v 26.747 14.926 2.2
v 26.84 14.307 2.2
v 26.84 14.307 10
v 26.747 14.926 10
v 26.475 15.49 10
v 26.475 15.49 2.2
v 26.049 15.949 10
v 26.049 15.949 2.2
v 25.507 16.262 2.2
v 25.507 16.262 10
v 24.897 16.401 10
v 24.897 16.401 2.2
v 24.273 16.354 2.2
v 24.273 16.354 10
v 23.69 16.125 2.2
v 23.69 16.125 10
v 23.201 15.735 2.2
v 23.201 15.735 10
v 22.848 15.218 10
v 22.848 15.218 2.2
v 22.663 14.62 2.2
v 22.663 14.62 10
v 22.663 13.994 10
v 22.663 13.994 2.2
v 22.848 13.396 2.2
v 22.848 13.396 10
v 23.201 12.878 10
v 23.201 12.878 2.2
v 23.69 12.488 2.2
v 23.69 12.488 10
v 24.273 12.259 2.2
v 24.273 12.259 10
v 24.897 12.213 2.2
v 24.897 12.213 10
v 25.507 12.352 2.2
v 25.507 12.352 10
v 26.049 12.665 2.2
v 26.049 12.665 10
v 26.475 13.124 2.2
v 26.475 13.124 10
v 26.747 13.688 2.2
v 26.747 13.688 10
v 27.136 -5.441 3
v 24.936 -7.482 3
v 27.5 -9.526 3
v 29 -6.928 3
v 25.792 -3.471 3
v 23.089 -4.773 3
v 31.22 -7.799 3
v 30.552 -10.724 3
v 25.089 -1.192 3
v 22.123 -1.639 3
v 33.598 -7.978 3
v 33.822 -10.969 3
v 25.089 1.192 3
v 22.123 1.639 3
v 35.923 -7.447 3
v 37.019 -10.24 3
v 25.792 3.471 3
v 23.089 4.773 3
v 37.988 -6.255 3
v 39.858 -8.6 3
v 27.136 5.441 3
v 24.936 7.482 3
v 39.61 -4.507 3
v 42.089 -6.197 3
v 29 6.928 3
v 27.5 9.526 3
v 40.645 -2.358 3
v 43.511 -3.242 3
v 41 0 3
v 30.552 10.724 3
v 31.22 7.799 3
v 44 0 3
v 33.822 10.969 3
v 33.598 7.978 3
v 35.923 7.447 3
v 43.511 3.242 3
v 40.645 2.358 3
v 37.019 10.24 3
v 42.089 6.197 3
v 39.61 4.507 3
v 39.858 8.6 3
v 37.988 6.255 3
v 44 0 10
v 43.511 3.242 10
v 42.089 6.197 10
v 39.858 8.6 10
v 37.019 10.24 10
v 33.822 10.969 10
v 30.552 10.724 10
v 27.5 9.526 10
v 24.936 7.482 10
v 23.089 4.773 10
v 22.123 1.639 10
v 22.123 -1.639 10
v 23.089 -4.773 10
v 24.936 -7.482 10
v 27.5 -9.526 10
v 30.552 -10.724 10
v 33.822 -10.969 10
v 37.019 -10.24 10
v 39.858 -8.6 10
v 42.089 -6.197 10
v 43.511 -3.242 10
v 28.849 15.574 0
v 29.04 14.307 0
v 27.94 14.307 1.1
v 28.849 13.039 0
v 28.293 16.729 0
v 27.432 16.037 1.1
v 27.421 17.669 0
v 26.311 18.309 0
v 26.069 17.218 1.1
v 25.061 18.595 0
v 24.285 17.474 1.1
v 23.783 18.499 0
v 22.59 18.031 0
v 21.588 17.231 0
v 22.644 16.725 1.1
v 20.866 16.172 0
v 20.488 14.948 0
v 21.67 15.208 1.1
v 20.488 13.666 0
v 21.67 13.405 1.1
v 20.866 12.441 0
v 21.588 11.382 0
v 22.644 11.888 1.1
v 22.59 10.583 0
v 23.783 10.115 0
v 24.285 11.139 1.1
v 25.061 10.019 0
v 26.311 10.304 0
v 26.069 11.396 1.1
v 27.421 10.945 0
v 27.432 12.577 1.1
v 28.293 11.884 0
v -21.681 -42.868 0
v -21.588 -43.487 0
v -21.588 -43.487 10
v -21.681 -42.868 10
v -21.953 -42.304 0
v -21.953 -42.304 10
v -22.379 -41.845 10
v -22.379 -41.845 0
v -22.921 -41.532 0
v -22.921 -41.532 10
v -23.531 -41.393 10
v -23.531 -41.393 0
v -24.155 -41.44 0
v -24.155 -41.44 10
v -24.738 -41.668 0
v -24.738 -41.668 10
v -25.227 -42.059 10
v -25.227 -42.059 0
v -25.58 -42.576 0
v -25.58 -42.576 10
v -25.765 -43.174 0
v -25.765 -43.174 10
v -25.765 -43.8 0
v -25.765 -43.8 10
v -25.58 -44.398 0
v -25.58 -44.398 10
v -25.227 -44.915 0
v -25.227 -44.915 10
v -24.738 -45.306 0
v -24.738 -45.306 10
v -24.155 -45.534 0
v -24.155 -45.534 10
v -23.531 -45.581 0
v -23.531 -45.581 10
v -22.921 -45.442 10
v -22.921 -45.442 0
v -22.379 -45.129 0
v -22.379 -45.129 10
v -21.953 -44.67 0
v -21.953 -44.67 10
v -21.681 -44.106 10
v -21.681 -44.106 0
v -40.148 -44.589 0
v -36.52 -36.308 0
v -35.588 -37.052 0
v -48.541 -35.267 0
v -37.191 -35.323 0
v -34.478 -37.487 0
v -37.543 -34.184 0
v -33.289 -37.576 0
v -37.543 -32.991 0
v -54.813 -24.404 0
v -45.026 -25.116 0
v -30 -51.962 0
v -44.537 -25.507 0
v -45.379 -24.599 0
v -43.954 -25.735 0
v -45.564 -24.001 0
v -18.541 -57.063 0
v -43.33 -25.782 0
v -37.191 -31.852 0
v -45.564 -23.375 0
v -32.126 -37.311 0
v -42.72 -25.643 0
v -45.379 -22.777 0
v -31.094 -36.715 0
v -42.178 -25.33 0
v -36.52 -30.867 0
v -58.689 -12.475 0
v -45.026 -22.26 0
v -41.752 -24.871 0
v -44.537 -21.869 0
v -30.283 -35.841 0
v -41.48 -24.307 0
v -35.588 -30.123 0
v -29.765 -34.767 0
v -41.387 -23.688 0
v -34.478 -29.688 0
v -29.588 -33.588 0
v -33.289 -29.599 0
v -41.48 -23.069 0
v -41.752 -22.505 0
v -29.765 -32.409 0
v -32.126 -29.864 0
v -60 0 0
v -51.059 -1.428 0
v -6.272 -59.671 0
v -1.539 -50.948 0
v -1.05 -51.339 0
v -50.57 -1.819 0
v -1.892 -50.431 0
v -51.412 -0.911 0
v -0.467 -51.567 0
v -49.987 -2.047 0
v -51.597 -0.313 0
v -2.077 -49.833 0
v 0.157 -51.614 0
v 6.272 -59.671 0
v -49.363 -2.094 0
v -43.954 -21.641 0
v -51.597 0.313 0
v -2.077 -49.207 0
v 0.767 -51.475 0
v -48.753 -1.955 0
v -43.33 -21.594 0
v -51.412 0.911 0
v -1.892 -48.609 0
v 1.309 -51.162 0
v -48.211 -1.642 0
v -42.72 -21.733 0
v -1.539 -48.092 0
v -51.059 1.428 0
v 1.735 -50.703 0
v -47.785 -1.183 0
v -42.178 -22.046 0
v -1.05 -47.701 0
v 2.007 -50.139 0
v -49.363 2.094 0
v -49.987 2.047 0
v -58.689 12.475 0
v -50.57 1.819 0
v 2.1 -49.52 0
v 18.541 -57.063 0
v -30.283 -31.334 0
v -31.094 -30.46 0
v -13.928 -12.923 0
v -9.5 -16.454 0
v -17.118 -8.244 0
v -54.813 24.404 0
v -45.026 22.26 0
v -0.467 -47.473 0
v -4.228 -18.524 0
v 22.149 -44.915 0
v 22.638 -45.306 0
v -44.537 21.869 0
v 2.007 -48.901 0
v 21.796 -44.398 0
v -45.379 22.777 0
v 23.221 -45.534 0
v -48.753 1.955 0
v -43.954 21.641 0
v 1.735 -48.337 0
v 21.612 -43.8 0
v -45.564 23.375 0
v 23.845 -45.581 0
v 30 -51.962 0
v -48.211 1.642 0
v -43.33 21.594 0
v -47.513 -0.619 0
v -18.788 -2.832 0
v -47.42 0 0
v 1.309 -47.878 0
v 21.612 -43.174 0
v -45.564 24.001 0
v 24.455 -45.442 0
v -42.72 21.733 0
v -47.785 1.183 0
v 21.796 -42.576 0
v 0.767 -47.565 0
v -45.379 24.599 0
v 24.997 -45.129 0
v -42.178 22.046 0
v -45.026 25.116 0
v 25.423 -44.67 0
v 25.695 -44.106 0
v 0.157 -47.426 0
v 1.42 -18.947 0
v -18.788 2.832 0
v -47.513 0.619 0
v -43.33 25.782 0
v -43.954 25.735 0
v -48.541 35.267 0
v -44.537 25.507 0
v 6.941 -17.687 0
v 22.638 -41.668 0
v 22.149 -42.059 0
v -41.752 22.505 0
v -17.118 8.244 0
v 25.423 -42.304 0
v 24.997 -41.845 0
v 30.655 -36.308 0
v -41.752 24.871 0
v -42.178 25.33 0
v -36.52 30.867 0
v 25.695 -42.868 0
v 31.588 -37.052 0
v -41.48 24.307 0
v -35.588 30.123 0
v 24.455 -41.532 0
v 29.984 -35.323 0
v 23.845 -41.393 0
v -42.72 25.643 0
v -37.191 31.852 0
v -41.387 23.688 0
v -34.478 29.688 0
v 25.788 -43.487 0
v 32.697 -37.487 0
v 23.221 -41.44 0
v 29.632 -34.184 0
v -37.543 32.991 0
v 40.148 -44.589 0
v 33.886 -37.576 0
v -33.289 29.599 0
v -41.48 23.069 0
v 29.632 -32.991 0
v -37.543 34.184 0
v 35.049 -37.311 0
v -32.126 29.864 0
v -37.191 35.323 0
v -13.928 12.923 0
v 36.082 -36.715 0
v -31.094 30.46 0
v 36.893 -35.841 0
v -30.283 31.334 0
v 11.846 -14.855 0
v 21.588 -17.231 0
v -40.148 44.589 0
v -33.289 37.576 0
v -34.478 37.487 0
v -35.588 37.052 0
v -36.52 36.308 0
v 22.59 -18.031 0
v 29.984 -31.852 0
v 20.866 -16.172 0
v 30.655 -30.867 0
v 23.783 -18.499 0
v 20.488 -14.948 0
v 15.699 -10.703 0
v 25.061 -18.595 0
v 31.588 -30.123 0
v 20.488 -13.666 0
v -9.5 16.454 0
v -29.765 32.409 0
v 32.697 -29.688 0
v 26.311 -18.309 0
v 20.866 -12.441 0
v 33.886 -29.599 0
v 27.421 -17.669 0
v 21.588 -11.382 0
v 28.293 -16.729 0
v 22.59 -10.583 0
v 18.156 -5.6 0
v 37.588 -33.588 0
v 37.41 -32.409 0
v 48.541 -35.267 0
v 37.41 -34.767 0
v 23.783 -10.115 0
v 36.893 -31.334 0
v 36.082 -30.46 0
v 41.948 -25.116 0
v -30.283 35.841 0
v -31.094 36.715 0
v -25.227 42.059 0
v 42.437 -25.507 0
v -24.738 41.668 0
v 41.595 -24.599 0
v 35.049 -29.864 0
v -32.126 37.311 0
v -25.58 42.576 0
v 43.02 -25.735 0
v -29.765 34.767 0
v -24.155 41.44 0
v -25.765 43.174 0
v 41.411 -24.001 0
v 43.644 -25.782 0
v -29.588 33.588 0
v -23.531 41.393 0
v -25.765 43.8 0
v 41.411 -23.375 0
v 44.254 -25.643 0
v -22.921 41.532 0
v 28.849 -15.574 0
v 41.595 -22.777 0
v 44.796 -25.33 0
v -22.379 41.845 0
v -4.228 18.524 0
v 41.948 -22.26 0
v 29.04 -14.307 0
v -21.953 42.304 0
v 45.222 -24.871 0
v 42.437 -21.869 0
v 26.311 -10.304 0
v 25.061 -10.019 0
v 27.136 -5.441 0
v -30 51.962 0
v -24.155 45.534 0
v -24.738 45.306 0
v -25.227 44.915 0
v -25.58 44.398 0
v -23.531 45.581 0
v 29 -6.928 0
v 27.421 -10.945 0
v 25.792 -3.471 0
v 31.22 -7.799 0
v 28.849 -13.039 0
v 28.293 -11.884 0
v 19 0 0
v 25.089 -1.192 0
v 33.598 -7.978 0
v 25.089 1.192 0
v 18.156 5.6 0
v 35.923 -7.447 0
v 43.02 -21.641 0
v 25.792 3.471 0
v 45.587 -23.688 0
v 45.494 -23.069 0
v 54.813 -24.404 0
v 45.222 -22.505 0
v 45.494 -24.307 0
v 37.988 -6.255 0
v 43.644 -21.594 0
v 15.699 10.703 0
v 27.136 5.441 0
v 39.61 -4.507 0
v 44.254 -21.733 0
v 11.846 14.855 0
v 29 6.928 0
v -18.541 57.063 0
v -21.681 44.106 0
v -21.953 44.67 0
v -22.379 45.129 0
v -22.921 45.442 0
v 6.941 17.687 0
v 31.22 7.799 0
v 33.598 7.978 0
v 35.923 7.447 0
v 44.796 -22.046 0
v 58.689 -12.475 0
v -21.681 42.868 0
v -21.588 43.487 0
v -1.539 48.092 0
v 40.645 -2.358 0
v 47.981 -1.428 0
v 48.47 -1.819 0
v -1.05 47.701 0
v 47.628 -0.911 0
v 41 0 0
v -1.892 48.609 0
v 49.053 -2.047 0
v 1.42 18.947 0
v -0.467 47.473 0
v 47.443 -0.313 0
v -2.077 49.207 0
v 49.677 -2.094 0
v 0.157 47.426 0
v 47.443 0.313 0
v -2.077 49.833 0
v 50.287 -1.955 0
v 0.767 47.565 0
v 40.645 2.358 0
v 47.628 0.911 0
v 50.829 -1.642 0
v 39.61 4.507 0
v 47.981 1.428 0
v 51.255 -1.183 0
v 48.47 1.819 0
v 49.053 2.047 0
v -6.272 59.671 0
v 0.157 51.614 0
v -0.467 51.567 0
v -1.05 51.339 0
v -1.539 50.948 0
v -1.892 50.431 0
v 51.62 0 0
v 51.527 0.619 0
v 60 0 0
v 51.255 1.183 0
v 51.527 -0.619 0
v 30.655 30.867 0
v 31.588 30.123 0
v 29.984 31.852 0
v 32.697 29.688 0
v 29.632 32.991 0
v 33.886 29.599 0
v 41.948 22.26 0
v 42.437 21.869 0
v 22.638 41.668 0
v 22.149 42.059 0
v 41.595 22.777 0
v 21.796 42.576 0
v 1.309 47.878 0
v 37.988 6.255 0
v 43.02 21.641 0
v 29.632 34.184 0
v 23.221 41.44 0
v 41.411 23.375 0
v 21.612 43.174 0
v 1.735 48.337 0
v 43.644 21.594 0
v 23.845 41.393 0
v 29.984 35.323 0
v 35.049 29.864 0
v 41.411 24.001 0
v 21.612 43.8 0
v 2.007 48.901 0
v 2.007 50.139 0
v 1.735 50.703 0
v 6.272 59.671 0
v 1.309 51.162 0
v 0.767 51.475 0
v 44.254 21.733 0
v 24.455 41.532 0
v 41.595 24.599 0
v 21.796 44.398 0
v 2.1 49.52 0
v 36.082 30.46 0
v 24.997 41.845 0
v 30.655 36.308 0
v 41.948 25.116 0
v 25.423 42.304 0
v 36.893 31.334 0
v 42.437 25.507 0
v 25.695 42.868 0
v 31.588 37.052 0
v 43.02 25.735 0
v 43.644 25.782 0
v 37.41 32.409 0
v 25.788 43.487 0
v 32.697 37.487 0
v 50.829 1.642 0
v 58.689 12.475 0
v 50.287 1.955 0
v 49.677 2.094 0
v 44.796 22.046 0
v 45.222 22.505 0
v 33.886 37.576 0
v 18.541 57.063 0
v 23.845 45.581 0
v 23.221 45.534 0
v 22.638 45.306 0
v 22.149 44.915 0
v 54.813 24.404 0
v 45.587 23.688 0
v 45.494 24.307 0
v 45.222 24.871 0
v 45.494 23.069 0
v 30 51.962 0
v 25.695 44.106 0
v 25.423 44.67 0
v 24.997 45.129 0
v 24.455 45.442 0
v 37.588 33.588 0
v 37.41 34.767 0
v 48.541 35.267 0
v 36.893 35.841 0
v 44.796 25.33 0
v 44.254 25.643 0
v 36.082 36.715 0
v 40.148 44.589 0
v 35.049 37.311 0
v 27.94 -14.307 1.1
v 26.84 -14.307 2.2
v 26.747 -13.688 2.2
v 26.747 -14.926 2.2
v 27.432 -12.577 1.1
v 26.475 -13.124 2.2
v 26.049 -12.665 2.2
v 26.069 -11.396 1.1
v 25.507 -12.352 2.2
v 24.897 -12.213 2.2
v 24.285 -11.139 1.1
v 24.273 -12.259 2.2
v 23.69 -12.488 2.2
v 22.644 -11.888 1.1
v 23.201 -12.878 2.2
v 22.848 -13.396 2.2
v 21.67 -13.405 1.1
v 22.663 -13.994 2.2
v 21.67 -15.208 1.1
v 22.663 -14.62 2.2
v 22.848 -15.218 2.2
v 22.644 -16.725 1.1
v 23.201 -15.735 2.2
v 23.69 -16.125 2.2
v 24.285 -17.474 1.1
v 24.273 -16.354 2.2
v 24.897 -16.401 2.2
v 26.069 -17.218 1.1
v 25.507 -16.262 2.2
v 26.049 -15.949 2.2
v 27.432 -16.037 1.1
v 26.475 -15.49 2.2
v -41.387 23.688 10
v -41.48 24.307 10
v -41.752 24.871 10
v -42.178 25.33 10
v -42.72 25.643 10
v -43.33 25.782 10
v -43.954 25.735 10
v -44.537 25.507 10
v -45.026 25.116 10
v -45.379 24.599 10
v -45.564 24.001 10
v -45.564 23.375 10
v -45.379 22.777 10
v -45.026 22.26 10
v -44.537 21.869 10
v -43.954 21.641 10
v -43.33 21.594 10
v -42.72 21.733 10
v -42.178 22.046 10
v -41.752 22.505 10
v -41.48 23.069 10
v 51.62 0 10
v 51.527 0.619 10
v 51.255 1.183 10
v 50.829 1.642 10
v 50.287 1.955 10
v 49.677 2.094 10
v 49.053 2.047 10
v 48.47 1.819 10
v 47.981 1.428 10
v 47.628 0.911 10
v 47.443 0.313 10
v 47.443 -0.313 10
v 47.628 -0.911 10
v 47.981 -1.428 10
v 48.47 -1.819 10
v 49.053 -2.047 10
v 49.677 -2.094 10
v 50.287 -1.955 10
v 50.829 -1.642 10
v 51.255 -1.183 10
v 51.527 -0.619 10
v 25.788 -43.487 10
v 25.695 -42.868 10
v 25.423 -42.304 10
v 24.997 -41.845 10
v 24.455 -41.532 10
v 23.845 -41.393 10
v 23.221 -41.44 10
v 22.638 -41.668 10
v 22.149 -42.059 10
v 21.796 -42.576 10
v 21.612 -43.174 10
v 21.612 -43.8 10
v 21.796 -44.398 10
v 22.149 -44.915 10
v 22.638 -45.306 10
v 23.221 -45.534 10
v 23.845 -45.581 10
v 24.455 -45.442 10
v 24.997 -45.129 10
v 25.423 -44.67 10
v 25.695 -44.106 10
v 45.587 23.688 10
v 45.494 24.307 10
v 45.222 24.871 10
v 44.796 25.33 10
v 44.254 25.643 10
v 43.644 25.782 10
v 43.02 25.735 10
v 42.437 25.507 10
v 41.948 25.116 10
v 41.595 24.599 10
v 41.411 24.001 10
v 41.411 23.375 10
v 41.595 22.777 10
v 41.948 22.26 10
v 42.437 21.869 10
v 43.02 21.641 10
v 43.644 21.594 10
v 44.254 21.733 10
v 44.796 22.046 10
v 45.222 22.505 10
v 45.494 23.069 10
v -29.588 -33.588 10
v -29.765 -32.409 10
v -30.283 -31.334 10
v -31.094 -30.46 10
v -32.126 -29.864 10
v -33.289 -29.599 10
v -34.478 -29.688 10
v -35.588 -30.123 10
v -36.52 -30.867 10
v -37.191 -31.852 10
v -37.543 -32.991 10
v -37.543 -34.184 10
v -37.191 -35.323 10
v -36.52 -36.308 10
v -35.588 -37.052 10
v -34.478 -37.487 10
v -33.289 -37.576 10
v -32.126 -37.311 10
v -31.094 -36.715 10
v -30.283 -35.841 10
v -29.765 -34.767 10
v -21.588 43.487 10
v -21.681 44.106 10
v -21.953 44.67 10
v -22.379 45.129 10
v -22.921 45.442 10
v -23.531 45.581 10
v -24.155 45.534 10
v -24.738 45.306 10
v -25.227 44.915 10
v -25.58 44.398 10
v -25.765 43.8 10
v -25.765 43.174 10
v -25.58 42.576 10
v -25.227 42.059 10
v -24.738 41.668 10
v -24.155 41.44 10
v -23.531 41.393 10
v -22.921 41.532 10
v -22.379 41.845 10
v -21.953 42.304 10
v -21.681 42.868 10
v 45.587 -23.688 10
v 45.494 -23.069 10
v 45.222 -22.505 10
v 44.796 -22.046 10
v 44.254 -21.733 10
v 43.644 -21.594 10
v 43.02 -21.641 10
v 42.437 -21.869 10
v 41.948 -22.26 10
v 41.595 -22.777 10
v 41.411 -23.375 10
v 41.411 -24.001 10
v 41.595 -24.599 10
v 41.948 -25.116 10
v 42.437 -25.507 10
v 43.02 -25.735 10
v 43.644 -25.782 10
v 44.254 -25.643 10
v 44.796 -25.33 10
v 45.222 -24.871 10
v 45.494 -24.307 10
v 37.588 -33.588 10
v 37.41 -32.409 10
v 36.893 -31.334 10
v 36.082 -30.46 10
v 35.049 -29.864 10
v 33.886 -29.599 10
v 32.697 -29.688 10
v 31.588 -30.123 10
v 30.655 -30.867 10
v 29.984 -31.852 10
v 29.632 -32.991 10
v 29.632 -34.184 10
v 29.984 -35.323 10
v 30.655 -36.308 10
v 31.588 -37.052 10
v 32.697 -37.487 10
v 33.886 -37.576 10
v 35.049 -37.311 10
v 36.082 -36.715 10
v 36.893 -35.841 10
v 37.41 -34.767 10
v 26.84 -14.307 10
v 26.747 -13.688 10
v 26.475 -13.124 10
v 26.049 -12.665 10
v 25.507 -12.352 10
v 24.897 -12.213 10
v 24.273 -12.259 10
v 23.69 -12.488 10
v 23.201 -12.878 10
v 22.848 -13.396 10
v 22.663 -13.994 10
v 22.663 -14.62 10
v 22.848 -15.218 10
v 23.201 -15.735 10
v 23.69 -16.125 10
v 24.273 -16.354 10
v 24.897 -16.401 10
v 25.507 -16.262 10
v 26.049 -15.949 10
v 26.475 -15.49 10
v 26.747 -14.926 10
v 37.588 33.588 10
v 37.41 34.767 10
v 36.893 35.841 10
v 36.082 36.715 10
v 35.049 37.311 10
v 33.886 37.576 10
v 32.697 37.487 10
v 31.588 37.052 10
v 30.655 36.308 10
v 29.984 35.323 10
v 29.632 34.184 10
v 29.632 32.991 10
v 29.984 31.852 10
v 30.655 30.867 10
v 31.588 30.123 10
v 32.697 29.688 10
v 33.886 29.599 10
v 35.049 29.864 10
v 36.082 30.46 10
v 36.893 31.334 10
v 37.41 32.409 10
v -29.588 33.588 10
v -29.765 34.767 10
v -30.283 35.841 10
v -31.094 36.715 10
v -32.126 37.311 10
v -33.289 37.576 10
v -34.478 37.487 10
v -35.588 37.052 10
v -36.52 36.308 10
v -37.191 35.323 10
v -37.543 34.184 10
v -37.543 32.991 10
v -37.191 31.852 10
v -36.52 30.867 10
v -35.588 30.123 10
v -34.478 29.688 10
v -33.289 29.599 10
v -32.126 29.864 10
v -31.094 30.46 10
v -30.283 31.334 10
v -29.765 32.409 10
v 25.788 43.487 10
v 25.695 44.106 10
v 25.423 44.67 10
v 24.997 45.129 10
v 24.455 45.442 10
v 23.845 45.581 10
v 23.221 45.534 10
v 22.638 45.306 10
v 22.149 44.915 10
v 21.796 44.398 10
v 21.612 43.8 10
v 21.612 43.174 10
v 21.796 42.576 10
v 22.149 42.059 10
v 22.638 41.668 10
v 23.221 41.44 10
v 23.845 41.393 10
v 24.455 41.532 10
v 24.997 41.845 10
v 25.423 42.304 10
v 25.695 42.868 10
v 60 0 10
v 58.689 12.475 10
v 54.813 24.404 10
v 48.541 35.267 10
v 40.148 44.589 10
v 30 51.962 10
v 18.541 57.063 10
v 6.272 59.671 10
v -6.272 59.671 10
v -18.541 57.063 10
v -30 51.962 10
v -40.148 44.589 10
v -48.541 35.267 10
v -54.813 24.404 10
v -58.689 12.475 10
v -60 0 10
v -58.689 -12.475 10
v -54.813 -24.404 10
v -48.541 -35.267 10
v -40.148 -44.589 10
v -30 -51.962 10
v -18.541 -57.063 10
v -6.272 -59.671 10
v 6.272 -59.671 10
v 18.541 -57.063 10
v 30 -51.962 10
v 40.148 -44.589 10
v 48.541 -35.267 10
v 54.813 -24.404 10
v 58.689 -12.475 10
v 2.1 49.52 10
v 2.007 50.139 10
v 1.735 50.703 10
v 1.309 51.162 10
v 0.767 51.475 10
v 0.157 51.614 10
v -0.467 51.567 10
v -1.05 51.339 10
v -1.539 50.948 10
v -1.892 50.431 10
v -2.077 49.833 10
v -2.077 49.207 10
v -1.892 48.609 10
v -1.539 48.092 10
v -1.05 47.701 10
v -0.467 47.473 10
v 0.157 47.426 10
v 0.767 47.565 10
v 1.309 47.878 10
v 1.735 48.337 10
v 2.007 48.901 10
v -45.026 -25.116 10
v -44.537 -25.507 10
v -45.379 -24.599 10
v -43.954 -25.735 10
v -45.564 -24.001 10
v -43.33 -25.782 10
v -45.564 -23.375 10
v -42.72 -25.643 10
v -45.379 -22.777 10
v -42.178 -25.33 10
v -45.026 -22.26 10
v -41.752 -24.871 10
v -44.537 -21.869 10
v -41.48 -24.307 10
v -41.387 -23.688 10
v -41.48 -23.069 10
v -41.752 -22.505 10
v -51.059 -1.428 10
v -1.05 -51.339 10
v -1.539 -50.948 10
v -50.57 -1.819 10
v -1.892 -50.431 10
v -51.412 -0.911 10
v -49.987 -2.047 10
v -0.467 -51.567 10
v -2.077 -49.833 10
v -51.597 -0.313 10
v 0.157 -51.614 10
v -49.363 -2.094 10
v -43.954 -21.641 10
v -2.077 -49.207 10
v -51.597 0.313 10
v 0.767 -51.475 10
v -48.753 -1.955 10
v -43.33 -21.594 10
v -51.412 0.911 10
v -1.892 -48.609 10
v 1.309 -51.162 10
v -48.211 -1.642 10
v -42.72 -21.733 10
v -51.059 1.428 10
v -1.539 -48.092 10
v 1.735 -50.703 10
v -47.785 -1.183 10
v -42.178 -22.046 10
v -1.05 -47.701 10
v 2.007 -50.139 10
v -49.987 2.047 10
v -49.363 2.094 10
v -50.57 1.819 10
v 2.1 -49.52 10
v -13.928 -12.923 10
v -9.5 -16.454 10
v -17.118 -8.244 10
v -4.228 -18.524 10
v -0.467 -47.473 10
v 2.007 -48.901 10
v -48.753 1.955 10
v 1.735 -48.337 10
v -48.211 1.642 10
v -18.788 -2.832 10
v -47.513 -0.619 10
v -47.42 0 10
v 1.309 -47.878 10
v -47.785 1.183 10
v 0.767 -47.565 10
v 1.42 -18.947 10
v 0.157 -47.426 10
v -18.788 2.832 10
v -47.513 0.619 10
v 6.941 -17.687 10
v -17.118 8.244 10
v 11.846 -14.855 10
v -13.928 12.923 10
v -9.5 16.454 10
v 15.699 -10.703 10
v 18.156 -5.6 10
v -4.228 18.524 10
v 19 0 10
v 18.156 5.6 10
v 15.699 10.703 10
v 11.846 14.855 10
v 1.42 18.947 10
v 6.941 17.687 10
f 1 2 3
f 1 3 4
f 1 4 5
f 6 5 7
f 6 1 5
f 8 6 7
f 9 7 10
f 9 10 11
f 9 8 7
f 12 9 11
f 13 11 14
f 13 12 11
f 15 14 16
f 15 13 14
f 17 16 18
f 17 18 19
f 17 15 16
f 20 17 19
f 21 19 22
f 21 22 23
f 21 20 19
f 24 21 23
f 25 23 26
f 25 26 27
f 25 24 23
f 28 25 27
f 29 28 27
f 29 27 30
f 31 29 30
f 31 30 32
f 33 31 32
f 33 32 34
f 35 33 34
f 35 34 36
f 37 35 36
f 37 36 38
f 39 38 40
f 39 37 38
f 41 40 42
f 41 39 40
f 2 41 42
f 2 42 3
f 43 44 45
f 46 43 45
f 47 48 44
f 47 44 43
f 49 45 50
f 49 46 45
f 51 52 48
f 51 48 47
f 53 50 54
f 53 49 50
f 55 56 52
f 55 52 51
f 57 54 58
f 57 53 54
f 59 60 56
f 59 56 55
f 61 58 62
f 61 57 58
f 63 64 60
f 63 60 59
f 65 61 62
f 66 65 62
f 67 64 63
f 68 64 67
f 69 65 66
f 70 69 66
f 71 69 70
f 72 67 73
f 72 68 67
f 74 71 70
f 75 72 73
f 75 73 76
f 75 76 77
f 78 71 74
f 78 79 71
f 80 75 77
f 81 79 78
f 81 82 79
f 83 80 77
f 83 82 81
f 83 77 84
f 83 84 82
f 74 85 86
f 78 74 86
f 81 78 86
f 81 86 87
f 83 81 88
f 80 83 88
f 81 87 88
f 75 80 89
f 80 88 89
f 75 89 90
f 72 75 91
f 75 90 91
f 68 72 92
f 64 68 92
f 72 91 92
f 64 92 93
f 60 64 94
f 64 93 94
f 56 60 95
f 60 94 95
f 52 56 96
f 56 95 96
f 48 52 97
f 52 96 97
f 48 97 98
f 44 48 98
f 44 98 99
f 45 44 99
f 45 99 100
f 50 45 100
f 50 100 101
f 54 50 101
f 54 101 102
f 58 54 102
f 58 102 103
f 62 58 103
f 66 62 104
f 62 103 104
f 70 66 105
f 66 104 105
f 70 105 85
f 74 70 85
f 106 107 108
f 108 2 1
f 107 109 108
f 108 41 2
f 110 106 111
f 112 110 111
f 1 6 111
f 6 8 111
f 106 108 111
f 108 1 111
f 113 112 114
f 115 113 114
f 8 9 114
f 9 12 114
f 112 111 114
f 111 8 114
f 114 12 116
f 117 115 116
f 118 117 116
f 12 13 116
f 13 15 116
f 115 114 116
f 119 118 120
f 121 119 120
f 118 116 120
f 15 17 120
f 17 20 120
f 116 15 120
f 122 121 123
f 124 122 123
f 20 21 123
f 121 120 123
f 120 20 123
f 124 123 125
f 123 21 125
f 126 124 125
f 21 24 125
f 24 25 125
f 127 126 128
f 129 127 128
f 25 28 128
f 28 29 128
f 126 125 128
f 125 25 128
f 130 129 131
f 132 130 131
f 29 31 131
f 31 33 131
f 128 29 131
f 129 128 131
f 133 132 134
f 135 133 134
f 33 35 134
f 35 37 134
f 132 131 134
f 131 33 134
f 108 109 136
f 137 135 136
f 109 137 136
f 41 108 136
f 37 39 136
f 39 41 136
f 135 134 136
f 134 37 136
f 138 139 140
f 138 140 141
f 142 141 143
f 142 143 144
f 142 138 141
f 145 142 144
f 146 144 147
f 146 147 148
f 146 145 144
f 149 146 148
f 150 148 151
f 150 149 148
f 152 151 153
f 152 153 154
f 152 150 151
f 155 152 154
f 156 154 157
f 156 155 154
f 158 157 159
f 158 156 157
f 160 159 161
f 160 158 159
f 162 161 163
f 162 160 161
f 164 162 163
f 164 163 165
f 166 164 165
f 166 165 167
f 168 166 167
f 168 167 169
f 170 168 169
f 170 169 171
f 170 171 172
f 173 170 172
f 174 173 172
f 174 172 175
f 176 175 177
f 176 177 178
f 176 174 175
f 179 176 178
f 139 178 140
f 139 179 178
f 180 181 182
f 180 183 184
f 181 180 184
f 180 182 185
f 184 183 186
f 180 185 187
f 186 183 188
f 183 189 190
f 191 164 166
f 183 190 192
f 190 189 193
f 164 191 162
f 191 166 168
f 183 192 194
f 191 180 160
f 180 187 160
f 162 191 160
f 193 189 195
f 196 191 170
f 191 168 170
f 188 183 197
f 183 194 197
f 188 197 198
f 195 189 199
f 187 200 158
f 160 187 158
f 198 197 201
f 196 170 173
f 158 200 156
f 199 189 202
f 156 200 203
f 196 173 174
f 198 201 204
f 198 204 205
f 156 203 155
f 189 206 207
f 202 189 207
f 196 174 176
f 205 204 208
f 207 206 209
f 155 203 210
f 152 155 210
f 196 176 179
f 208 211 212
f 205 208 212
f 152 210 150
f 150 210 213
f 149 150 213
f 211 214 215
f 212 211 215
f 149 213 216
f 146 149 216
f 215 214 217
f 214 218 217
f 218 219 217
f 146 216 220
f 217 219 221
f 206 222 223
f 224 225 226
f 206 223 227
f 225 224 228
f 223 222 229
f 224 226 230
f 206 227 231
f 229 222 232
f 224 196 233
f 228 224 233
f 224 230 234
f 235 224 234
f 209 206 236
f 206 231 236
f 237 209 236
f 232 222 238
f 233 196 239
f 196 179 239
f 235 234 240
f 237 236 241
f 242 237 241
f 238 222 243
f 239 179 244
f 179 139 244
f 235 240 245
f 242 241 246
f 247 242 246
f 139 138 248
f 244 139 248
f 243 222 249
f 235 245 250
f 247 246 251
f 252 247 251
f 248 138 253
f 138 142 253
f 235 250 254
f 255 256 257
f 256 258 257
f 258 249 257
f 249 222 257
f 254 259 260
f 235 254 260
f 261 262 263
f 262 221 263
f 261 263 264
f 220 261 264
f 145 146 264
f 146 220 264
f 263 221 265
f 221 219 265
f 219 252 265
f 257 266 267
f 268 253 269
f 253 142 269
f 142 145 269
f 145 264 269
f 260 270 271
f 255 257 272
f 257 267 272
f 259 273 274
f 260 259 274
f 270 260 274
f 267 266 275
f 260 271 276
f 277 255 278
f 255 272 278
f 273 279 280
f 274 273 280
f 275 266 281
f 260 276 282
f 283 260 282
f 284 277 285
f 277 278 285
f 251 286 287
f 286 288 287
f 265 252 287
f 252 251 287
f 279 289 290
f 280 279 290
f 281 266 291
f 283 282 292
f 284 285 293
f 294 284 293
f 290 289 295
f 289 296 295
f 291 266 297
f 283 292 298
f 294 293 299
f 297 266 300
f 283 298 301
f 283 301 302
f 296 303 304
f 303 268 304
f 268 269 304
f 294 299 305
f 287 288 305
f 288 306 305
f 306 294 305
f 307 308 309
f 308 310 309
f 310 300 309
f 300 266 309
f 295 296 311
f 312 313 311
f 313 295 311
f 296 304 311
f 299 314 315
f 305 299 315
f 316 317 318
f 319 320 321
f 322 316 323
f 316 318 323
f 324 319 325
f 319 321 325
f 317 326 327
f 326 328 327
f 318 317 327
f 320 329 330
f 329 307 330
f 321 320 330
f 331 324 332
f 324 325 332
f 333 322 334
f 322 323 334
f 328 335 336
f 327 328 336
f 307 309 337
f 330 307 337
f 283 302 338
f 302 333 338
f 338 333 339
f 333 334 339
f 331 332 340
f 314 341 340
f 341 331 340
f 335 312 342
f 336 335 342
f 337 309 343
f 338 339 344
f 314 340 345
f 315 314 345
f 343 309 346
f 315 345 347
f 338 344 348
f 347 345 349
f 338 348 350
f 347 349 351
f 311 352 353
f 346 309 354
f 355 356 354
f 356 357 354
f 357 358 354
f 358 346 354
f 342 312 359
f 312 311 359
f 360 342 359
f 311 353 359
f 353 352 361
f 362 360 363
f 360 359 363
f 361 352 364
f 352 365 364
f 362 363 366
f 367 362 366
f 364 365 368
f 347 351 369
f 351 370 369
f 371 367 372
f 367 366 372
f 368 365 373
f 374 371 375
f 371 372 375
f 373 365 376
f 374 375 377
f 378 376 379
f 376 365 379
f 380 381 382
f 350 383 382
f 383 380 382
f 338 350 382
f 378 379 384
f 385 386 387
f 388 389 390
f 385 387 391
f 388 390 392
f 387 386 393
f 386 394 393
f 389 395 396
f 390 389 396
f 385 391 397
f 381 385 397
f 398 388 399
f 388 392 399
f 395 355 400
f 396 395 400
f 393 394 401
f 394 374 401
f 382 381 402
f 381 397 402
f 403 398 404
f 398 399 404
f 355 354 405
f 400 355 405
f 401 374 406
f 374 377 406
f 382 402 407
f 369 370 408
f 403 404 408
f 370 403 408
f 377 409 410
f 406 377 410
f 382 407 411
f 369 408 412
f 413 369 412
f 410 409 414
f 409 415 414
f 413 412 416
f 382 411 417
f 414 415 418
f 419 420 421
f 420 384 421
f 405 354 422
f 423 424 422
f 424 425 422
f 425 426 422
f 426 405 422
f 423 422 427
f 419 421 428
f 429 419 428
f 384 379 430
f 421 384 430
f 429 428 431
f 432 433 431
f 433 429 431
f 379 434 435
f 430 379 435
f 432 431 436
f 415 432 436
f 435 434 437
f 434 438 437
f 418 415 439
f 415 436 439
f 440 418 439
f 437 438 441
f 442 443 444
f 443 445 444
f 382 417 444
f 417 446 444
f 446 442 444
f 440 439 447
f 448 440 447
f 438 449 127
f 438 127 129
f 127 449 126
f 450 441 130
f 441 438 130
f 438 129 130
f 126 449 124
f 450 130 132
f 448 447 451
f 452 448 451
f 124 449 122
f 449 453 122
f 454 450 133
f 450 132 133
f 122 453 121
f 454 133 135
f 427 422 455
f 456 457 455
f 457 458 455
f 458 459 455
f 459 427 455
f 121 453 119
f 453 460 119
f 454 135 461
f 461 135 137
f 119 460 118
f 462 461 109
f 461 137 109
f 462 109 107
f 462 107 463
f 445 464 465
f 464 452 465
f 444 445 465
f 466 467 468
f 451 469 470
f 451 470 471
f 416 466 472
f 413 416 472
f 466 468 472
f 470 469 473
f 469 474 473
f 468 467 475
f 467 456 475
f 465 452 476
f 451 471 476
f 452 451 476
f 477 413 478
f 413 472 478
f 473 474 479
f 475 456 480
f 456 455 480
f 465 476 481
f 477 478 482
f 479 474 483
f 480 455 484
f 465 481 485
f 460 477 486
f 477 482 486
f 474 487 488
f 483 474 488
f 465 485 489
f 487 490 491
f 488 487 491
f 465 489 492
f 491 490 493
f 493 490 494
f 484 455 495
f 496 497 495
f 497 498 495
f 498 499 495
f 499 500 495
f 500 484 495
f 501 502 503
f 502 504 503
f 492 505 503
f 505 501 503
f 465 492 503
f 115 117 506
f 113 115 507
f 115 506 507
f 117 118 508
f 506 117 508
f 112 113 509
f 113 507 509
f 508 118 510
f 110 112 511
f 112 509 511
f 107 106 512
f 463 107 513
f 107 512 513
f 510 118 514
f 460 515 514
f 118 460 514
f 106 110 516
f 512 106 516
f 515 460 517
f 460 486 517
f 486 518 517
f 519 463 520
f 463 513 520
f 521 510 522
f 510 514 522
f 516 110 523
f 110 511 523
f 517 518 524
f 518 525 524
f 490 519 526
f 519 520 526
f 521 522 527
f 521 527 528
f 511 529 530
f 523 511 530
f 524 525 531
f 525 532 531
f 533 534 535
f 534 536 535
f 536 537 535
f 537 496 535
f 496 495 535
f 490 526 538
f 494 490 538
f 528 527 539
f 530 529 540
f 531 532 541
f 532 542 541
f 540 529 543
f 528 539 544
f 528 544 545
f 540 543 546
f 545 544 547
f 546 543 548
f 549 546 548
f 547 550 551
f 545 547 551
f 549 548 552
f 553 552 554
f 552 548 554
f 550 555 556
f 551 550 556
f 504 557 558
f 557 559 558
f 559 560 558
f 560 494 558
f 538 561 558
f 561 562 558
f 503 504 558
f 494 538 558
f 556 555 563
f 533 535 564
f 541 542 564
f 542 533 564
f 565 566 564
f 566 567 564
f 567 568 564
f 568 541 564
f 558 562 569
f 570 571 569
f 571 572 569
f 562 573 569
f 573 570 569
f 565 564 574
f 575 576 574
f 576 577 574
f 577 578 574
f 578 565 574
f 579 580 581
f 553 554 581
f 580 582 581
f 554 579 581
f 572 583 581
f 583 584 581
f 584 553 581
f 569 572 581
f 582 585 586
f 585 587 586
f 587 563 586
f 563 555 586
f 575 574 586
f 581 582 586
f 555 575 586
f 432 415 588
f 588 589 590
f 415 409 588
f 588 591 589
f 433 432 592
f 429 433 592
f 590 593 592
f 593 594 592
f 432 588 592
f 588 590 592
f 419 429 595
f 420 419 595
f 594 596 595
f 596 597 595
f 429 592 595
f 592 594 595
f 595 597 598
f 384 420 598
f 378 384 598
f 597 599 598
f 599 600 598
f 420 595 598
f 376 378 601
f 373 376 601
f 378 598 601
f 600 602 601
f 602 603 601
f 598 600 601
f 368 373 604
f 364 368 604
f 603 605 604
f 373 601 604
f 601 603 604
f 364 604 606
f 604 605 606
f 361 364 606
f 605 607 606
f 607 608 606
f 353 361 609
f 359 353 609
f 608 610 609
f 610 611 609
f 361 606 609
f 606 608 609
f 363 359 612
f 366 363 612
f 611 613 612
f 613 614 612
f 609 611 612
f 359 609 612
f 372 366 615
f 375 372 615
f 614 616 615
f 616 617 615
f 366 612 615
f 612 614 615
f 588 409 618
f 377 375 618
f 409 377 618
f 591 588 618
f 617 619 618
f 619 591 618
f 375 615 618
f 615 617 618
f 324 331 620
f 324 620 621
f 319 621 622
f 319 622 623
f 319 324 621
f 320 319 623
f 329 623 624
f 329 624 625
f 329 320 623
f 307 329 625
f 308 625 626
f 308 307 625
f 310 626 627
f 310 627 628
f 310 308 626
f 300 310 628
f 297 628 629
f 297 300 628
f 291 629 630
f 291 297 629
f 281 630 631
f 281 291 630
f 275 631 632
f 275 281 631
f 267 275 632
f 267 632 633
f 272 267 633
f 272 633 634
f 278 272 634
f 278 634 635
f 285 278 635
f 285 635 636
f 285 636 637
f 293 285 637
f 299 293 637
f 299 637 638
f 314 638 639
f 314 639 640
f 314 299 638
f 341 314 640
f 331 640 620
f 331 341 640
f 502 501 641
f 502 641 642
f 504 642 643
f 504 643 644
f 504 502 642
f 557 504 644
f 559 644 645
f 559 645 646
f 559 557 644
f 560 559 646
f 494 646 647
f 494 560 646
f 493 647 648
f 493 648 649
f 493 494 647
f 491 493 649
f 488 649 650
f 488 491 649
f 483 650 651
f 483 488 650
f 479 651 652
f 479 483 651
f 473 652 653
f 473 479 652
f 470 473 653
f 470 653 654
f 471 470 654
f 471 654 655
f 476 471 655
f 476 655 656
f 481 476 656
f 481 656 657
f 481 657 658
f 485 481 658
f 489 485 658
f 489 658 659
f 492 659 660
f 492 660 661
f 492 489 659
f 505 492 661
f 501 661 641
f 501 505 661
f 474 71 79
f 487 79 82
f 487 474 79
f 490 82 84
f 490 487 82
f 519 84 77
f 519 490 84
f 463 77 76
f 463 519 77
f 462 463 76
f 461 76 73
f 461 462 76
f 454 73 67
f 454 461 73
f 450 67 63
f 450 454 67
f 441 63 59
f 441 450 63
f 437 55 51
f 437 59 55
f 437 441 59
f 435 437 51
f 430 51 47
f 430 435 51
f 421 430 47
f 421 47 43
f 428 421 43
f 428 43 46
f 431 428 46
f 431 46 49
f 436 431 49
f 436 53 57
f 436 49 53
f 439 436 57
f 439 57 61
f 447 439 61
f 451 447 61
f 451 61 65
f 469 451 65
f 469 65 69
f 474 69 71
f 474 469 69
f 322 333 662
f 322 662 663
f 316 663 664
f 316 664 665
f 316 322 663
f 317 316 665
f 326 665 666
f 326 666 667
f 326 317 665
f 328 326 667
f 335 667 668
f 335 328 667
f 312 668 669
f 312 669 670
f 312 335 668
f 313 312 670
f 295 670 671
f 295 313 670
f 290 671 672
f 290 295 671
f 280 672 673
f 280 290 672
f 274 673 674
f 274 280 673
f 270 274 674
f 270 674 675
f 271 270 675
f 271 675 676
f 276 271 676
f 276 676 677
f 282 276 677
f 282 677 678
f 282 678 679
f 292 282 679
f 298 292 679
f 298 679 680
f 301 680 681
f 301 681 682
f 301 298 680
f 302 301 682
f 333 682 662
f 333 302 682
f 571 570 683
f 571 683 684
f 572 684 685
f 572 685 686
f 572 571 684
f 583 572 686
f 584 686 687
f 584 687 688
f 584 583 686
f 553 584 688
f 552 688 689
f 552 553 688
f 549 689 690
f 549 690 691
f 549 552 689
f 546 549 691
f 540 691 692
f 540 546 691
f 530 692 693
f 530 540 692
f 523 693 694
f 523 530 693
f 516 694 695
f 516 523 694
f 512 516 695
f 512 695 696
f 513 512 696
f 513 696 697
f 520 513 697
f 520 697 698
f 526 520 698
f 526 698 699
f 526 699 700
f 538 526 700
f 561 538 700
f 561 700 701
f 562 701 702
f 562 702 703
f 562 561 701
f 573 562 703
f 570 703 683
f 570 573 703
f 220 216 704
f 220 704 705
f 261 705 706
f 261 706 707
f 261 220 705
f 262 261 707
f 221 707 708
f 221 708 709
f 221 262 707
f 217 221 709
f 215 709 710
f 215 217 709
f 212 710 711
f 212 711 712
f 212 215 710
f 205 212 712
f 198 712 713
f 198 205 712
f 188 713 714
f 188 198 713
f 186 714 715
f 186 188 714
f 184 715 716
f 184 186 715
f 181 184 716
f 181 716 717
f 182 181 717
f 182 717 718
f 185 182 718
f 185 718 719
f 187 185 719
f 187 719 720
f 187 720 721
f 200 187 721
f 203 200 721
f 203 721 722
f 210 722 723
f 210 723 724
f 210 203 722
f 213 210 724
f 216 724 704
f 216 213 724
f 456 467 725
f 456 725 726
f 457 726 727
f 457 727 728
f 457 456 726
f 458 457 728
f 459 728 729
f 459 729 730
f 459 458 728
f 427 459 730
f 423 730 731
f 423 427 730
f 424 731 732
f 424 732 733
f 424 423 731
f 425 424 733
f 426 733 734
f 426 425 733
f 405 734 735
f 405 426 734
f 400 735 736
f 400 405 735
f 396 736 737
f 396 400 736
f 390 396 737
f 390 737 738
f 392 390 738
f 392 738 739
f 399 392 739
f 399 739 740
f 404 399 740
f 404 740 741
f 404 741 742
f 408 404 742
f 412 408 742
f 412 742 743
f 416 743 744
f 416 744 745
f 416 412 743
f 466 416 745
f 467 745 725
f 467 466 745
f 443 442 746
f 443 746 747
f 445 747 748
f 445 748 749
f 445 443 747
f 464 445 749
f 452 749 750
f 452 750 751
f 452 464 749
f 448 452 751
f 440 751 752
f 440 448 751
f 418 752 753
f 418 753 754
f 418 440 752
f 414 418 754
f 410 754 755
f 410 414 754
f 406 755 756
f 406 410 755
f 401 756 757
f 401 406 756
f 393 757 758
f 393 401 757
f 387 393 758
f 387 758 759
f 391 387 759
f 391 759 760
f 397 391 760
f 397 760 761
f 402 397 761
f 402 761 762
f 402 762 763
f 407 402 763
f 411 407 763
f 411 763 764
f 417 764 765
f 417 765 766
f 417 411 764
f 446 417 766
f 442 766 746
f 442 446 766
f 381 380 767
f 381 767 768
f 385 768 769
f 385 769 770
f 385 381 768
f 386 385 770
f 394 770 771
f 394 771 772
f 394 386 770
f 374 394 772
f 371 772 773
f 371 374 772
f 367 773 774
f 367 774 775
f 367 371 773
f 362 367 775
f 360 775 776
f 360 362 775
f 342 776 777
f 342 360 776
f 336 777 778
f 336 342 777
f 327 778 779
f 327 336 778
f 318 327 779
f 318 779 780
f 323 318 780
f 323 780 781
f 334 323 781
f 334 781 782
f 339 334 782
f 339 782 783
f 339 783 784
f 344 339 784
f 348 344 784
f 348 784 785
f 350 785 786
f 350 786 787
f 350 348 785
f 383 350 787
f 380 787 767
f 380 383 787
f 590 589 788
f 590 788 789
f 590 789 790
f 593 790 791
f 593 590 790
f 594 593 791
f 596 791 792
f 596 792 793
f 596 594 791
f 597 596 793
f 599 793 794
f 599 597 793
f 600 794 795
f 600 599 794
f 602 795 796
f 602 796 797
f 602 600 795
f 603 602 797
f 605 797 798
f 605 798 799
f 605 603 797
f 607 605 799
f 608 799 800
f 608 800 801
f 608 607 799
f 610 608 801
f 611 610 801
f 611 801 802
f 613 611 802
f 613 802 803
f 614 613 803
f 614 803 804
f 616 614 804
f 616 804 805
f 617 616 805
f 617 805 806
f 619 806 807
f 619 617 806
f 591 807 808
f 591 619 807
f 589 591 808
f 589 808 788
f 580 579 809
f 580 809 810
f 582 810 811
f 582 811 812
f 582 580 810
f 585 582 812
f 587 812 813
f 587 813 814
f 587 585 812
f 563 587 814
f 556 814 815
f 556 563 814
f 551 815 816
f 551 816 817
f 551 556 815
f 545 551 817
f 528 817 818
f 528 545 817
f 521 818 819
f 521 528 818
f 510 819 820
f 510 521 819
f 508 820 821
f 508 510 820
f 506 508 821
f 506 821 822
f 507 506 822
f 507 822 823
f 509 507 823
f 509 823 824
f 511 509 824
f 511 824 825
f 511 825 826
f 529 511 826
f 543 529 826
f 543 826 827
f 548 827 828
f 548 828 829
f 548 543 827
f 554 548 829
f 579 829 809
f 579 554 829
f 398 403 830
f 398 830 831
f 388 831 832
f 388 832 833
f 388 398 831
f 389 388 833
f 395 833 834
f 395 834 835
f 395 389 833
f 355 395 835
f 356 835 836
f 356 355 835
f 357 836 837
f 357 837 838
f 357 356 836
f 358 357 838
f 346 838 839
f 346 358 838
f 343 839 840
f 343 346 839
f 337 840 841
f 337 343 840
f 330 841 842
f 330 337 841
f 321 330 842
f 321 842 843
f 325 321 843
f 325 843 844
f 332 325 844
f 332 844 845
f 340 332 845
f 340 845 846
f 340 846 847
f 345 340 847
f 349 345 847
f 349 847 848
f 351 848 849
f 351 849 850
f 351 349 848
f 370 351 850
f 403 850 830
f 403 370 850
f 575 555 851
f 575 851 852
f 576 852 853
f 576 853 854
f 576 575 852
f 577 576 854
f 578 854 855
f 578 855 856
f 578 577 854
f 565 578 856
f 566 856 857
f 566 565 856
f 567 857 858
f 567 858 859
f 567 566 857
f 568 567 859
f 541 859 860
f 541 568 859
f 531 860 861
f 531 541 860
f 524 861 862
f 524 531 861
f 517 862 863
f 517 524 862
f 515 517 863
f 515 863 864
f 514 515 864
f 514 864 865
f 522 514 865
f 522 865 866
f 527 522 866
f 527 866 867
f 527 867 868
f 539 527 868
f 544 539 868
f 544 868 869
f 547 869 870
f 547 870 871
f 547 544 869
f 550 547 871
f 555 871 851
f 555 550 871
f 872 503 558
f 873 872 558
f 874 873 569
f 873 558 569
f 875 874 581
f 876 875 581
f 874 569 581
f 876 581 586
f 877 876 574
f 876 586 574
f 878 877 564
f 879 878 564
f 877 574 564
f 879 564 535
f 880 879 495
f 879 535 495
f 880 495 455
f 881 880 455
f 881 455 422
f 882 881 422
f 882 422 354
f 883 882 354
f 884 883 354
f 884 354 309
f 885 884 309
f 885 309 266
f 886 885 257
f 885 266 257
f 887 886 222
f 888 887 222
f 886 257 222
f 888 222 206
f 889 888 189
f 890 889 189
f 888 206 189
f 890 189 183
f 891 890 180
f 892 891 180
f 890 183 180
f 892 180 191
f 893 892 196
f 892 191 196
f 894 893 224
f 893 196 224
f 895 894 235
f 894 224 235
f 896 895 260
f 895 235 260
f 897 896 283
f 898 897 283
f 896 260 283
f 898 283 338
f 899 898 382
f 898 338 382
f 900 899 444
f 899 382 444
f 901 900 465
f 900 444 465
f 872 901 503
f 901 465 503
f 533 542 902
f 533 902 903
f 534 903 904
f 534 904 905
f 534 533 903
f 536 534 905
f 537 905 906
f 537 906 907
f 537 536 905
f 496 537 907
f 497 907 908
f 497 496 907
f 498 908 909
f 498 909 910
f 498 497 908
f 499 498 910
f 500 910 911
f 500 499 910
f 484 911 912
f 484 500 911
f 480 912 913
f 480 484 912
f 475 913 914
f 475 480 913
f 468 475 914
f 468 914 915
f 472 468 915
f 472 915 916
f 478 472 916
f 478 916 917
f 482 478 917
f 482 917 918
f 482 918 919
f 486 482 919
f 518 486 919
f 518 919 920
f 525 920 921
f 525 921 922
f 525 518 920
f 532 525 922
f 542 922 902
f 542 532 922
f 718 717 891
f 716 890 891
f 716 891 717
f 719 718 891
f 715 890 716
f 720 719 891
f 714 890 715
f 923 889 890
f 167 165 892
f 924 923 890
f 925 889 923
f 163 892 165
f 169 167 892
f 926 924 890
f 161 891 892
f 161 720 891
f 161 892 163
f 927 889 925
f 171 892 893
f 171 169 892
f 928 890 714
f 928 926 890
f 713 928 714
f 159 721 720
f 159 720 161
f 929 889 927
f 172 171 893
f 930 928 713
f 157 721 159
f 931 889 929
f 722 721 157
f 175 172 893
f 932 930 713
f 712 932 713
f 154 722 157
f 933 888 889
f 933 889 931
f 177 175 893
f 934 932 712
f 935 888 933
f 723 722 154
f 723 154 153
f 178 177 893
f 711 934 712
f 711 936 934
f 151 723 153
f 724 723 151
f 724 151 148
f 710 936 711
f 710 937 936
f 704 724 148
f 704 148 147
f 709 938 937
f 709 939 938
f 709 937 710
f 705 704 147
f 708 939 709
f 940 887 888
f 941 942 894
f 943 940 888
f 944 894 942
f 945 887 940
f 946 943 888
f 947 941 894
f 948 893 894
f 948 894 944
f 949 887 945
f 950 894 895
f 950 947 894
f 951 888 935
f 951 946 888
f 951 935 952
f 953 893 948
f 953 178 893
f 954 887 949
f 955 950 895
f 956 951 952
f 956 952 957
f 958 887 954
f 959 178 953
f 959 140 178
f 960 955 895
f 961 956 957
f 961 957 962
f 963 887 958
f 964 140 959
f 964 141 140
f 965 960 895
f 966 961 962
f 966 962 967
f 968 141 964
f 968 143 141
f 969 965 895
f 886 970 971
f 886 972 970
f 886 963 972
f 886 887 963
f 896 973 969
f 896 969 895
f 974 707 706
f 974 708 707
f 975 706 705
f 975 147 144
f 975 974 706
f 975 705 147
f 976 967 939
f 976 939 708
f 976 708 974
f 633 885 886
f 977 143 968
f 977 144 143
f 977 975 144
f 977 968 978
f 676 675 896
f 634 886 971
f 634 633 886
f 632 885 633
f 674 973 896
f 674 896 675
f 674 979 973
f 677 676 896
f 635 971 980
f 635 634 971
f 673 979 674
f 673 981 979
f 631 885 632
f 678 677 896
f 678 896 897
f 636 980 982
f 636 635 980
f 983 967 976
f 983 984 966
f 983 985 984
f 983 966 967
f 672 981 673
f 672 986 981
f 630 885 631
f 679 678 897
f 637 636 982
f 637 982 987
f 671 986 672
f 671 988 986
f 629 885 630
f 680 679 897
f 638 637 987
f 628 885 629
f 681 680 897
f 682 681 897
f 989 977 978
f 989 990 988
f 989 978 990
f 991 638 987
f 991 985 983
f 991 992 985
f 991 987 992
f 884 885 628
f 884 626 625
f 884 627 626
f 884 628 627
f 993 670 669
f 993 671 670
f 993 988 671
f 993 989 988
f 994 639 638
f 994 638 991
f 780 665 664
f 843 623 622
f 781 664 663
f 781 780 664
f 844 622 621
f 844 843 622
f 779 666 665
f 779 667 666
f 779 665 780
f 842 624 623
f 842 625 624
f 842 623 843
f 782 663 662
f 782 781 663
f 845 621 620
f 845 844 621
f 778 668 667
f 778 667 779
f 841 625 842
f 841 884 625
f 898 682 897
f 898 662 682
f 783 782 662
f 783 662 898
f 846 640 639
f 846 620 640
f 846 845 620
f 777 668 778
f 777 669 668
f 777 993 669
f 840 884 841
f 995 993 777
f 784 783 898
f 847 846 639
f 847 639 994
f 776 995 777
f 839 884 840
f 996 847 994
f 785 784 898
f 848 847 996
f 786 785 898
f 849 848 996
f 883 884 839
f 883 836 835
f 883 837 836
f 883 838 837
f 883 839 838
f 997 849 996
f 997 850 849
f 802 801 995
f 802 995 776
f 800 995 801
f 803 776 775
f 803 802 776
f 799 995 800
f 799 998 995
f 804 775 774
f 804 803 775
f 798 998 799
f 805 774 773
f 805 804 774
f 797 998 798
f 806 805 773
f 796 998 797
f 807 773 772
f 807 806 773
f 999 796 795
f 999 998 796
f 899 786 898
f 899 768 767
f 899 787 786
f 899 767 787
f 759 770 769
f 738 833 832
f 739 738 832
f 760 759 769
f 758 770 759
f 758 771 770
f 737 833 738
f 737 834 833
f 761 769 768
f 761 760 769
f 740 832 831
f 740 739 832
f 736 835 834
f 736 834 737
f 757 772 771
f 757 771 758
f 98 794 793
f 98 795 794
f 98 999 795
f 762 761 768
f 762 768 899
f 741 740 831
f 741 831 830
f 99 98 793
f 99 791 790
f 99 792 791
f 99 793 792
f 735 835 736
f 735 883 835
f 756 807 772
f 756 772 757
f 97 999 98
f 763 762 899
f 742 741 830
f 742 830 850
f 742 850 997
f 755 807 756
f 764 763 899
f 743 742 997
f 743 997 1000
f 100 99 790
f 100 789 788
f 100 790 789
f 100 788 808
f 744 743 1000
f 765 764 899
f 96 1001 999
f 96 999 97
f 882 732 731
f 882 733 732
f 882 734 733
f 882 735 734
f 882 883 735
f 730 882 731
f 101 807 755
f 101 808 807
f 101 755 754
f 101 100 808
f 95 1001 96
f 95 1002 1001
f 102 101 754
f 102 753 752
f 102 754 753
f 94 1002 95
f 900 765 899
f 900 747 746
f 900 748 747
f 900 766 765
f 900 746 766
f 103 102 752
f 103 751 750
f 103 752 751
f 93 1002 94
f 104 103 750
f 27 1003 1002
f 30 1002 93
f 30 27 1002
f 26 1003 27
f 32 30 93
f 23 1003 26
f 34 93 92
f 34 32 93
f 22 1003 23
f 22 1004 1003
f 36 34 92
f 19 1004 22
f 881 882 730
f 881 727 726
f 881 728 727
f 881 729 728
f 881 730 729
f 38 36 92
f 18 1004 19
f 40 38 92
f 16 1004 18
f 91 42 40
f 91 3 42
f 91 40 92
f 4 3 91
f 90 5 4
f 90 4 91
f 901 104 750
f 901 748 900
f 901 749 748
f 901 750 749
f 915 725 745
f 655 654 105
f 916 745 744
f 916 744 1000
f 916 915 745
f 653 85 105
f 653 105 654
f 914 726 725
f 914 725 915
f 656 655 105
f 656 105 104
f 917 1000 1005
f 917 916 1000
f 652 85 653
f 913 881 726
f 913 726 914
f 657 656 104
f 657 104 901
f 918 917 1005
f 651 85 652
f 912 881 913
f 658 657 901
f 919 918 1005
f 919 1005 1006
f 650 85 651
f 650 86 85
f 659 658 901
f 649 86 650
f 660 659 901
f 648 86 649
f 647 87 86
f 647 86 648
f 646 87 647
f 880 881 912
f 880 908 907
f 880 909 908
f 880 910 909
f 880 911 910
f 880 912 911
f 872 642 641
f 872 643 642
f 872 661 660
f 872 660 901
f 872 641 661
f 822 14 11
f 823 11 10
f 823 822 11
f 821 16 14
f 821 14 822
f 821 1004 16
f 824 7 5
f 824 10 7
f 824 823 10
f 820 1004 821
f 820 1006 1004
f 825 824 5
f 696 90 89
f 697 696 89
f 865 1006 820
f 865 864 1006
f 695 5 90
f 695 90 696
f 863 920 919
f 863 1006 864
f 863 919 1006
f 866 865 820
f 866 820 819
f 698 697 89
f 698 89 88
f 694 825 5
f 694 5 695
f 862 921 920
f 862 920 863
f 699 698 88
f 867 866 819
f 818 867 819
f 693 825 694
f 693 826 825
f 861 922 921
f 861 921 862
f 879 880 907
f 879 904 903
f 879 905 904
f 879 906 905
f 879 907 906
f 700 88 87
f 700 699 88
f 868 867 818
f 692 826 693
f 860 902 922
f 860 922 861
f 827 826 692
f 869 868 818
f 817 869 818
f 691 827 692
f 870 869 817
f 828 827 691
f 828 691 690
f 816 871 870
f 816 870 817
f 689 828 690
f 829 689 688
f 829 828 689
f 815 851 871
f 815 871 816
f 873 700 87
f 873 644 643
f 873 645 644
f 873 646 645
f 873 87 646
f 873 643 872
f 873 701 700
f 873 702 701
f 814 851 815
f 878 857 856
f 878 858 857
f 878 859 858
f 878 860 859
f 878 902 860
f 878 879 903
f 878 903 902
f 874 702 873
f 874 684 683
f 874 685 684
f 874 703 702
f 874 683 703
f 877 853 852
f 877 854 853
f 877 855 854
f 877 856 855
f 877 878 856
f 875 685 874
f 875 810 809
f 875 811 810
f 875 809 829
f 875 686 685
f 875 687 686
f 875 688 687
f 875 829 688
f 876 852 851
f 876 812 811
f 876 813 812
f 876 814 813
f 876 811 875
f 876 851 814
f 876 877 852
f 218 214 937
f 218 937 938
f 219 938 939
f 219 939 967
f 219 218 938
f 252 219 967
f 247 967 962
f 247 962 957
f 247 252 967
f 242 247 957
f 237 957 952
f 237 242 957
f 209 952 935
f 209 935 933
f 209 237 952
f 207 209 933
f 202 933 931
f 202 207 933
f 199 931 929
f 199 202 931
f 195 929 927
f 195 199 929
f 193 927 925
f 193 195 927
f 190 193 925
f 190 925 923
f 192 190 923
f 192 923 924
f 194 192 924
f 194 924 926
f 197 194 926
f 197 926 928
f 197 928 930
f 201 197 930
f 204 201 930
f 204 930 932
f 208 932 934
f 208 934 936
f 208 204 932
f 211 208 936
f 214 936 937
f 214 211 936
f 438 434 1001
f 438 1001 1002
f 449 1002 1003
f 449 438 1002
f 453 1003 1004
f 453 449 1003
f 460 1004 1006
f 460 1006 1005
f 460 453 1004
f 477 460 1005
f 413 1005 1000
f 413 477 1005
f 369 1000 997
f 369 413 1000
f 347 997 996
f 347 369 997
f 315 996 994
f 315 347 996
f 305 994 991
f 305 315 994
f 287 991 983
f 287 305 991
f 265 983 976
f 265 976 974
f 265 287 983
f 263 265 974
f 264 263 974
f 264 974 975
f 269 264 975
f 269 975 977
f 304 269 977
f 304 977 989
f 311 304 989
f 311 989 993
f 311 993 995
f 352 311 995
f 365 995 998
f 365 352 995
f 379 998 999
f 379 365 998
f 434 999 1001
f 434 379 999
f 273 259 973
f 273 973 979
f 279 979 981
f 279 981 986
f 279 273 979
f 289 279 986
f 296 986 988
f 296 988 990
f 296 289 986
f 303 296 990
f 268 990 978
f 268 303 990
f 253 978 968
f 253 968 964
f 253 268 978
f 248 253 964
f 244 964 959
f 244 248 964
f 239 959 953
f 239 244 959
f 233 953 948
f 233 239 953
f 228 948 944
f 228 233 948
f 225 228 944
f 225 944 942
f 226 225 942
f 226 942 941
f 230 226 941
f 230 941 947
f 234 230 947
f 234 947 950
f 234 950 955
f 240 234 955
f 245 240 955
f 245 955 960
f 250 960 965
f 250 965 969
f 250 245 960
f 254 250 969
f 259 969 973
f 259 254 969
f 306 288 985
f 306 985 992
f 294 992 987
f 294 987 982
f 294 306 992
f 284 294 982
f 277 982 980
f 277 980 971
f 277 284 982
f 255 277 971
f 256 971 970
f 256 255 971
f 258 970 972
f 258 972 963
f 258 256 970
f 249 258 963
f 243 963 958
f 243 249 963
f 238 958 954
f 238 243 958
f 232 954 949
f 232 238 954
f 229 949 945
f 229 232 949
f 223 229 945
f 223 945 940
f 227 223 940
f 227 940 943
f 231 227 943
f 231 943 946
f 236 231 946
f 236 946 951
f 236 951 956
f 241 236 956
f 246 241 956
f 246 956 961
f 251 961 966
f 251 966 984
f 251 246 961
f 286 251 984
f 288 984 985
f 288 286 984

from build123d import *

# Parameters (mm, degrees)
SKETCH_R     = 60
SKETCH_R_2   = 2.1
SKETCH_R_3   = 19
SKETCH_R_4   = 8
SKETCH_R_5   = 4
PAD_DEPTH    = 10
SKETCH001_R  = 11
POCKET_DEPTH = 7
CHAMFER_SIZE = 2.2


with BuildPart() as part:
    # Sketch → Pad (new body)
    with BuildSketch(Plane.XY):
        Circle(SKETCH_R)
        with Locations((24.74, 14.30674)):
            Circle(SKETCH_R_2, mode=Mode.SUBTRACT)
        with Locations((24.74, -14.30674)):
            Circle(SKETCH_R_2, mode=Mode.SUBTRACT)
        Circle(SKETCH_R_3, mode=Mode.SUBTRACT)
        with Locations((33, 0)):
            Circle(SKETCH_R_4, mode=Mode.SUBTRACT)
        with Locations((49.52, 0)):
            Circle(SKETCH_R_2, mode=Mode.SUBTRACT)
        with Locations((-33.587572, 33.587572)):
            Circle(SKETCH_R_5, mode=Mode.SUBTRACT)
        with Locations((-33.587572, -33.587572)):
            Circle(SKETCH_R_5, mode=Mode.SUBTRACT)
        with Locations((33.587572, -33.587572)):
            Circle(SKETCH_R_5, mode=Mode.SUBTRACT)
        with Locations((33.587572, 33.587572)):
            Circle(SKETCH_R_5, mode=Mode.SUBTRACT)
        with Locations((-49.52, 0)):
            Circle(SKETCH_R_2, mode=Mode.SUBTRACT)
        with Locations((0, 49.52)):
            Circle(SKETCH_R_2, mode=Mode.SUBTRACT)
        with Locations((0, -49.52)):
            Circle(SKETCH_R_2, mode=Mode.SUBTRACT)
        with Locations((-43.487067, 23.688077)):
            Circle(SKETCH_R_2, mode=Mode.SUBTRACT)
        with Locations((-23.688077, 43.487067)):
            Circle(SKETCH_R_2, mode=Mode.SUBTRACT)
        with Locations((23.688077, -43.487067)):
            Circle(SKETCH_R_2, mode=Mode.SUBTRACT)
        with Locations((43.487067, -23.688077)):
            Circle(SKETCH_R_2, mode=Mode.SUBTRACT)
        with Locations((23.688077, 43.487067)):
            Circle(SKETCH_R_2, mode=Mode.SUBTRACT)
        with Locations((43.487067, 23.688077)):
            Circle(SKETCH_R_2, mode=Mode.SUBTRACT)
        with Locations((-43.487067, -23.688077)):
            Circle(SKETCH_R_2, mode=Mode.SUBTRACT)
        with Locations((-23.688077, -43.487067)):
            Circle(SKETCH_R_2, mode=Mode.SUBTRACT)
    extrude(amount=PAD_DEPTH)

    # Sketch001 (on Face23 of Pad) → Pocket (cut)
    with BuildSketch(Plane.XY.offset(10)):
        with Locations((33, 0)):
            Circle(SKETCH001_R)
    extrude(amount=-POCKET_DEPTH, mode=Mode.SUBTRACT)

    # Chamfer
    chamfer_edges = [part.edges().sort_by_distance(p)[0] for p in [
        (22.64, -14.30674, 0),
        (22.64, 14.30674, 0),
    ]]
    chamfer(chamfer_edges, length=CHAMFER_SIZE)


solid = part.part
